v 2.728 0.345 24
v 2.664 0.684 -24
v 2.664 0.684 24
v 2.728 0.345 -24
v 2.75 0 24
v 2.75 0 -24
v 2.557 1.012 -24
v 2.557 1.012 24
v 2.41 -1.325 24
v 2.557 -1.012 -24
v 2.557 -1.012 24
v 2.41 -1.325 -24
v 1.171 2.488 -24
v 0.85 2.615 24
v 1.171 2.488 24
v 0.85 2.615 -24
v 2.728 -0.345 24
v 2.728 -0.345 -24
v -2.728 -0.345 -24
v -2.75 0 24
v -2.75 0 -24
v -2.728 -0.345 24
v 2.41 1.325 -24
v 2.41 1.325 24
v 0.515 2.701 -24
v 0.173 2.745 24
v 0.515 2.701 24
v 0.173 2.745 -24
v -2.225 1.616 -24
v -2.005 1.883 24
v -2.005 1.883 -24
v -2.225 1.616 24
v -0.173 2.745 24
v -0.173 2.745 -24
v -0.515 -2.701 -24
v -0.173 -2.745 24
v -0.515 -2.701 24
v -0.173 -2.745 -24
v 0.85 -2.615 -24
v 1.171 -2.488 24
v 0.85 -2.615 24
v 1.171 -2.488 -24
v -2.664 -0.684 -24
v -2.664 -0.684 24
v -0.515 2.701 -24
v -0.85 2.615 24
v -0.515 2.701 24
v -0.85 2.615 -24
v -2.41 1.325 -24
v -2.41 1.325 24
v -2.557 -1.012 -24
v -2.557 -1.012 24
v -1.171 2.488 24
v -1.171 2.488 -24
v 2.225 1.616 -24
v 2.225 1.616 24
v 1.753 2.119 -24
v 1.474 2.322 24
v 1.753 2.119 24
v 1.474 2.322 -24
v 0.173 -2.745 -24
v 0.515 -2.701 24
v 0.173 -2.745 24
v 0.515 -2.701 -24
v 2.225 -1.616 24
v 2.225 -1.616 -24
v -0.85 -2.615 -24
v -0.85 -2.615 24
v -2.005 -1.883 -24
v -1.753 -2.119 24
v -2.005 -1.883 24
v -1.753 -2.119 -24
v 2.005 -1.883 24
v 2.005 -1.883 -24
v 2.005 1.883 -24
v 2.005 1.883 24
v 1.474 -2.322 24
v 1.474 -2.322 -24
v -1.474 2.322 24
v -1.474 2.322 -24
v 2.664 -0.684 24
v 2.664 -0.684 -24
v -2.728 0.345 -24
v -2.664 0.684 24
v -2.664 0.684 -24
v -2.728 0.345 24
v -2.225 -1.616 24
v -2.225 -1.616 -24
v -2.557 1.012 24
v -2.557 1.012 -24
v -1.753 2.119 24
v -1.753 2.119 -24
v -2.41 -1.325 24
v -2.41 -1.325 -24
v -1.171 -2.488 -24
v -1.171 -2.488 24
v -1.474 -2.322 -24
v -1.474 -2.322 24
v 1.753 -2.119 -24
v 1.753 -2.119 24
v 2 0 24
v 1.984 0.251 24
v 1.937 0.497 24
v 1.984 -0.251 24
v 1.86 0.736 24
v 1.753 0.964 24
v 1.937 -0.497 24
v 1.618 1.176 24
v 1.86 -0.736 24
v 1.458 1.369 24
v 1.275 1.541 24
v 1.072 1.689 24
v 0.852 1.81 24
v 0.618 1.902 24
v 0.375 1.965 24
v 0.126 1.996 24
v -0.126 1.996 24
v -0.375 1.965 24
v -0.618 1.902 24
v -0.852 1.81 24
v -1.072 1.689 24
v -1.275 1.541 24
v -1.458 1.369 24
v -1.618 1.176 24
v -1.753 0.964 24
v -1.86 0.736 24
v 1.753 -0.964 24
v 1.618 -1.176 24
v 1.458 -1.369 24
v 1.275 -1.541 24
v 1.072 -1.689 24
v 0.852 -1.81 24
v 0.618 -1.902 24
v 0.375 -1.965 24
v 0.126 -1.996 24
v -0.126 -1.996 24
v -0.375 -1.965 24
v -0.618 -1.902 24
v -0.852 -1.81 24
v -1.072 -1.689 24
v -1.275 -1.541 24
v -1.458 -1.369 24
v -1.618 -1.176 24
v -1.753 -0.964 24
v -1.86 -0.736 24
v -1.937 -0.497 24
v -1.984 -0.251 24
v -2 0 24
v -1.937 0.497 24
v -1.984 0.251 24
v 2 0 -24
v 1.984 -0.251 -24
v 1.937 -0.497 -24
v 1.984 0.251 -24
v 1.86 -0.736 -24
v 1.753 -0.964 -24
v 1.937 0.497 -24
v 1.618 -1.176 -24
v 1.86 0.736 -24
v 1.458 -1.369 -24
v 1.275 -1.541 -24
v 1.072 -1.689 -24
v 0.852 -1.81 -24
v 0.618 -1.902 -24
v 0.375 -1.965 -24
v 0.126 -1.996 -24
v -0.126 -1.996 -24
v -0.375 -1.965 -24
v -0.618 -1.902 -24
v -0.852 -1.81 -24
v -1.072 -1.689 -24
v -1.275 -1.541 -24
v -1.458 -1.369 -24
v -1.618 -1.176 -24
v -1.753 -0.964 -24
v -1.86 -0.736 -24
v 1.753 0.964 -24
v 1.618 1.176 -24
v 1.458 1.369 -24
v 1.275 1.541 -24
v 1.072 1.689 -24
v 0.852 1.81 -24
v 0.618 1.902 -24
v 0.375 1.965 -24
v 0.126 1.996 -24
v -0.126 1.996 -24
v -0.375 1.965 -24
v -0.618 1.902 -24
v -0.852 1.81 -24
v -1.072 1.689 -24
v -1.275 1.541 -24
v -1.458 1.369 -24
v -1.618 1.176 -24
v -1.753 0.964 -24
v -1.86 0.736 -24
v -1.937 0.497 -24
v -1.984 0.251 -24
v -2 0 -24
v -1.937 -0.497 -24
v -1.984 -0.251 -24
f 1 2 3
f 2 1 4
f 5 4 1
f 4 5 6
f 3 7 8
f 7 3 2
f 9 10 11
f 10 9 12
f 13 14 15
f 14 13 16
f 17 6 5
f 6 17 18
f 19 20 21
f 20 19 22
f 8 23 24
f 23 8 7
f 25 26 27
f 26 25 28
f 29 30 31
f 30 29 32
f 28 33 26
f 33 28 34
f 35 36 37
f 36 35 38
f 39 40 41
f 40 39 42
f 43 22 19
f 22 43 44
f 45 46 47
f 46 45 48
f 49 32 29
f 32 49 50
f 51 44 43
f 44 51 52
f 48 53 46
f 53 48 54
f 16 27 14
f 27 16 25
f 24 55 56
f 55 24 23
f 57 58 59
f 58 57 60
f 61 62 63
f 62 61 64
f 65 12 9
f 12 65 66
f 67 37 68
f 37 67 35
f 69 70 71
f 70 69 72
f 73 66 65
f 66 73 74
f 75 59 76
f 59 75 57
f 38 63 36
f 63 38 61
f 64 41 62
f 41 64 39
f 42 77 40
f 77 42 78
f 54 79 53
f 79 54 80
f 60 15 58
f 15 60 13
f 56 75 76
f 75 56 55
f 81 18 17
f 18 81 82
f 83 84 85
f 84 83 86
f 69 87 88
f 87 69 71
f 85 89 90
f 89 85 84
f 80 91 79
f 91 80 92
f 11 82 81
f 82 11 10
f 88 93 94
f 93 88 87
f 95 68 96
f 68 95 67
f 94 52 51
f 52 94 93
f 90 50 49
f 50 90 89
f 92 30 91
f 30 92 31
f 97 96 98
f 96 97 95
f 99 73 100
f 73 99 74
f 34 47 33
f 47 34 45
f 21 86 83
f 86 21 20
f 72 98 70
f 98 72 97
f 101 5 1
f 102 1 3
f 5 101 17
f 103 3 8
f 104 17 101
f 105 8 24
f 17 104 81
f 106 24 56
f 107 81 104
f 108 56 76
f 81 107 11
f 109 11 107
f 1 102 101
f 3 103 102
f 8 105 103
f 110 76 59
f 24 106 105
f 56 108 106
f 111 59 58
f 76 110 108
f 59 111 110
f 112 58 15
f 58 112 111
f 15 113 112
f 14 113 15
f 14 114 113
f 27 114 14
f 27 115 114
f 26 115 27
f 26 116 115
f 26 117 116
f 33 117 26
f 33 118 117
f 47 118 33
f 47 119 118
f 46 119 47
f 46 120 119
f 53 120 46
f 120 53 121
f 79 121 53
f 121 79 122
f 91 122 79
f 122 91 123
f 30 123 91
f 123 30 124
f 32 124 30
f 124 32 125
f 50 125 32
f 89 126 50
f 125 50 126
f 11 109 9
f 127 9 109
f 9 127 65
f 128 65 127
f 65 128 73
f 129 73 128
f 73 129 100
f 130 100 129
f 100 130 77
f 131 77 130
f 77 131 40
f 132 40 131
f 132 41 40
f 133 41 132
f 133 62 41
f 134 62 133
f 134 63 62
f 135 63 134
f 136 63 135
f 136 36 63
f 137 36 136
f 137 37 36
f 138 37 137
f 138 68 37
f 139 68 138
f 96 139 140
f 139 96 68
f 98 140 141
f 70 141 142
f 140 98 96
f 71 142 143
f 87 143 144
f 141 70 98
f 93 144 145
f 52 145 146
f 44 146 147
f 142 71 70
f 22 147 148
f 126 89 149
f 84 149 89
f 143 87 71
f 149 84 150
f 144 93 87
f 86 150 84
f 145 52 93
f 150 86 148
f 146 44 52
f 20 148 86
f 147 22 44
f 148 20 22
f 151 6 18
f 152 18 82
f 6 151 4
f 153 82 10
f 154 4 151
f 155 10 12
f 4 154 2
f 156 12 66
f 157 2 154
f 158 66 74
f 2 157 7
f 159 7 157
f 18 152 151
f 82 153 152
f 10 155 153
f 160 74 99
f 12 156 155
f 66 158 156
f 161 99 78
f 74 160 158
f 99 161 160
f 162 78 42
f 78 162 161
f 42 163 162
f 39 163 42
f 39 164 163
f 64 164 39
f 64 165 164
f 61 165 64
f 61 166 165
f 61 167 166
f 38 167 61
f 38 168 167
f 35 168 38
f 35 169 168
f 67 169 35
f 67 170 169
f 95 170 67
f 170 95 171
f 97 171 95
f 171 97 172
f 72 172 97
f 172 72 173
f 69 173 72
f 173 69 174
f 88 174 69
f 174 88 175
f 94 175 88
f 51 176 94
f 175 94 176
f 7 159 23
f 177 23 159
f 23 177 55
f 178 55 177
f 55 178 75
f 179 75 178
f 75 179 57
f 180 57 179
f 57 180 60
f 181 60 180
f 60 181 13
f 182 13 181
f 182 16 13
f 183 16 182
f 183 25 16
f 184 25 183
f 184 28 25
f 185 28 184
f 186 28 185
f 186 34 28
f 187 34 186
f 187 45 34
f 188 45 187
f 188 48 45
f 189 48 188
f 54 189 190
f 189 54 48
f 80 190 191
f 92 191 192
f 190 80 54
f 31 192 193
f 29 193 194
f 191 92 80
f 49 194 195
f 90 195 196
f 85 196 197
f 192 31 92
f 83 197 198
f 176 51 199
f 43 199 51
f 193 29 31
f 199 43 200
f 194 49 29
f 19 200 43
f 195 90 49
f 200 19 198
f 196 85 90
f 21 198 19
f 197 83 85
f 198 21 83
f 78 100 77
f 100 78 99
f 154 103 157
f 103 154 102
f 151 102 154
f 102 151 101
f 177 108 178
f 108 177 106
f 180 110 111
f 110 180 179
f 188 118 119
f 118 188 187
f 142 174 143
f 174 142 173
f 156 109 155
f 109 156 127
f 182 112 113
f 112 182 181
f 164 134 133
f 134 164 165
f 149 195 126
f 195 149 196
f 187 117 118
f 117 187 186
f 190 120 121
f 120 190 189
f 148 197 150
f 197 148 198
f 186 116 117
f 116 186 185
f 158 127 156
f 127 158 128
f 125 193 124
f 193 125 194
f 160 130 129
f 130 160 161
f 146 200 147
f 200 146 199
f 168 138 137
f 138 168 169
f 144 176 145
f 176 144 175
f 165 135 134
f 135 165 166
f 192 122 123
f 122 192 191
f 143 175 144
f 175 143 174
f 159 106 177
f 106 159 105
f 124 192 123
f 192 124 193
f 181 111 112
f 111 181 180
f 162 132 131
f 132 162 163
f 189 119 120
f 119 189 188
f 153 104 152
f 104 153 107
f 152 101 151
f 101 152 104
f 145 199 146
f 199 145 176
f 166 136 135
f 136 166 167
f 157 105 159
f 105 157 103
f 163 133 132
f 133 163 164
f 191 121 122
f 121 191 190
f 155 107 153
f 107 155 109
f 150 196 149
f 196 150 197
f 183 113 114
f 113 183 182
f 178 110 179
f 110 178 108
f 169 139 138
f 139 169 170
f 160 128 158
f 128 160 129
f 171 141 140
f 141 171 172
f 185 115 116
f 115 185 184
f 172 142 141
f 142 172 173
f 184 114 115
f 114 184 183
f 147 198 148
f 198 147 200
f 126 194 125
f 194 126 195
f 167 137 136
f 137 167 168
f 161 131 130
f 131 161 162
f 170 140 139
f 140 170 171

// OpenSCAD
$fn = 50;


difference() {
	union() {
		translate(v = [0, 0, -24.0000000000]) {
			cylinder(h = 48, r = 2.7500000000);
		}
	}
	union() {
		translate(v = [0, 0, -100.0000000000]) {
			cylinder(h = 200, r = 2.0000000000);
		}
	}
}
